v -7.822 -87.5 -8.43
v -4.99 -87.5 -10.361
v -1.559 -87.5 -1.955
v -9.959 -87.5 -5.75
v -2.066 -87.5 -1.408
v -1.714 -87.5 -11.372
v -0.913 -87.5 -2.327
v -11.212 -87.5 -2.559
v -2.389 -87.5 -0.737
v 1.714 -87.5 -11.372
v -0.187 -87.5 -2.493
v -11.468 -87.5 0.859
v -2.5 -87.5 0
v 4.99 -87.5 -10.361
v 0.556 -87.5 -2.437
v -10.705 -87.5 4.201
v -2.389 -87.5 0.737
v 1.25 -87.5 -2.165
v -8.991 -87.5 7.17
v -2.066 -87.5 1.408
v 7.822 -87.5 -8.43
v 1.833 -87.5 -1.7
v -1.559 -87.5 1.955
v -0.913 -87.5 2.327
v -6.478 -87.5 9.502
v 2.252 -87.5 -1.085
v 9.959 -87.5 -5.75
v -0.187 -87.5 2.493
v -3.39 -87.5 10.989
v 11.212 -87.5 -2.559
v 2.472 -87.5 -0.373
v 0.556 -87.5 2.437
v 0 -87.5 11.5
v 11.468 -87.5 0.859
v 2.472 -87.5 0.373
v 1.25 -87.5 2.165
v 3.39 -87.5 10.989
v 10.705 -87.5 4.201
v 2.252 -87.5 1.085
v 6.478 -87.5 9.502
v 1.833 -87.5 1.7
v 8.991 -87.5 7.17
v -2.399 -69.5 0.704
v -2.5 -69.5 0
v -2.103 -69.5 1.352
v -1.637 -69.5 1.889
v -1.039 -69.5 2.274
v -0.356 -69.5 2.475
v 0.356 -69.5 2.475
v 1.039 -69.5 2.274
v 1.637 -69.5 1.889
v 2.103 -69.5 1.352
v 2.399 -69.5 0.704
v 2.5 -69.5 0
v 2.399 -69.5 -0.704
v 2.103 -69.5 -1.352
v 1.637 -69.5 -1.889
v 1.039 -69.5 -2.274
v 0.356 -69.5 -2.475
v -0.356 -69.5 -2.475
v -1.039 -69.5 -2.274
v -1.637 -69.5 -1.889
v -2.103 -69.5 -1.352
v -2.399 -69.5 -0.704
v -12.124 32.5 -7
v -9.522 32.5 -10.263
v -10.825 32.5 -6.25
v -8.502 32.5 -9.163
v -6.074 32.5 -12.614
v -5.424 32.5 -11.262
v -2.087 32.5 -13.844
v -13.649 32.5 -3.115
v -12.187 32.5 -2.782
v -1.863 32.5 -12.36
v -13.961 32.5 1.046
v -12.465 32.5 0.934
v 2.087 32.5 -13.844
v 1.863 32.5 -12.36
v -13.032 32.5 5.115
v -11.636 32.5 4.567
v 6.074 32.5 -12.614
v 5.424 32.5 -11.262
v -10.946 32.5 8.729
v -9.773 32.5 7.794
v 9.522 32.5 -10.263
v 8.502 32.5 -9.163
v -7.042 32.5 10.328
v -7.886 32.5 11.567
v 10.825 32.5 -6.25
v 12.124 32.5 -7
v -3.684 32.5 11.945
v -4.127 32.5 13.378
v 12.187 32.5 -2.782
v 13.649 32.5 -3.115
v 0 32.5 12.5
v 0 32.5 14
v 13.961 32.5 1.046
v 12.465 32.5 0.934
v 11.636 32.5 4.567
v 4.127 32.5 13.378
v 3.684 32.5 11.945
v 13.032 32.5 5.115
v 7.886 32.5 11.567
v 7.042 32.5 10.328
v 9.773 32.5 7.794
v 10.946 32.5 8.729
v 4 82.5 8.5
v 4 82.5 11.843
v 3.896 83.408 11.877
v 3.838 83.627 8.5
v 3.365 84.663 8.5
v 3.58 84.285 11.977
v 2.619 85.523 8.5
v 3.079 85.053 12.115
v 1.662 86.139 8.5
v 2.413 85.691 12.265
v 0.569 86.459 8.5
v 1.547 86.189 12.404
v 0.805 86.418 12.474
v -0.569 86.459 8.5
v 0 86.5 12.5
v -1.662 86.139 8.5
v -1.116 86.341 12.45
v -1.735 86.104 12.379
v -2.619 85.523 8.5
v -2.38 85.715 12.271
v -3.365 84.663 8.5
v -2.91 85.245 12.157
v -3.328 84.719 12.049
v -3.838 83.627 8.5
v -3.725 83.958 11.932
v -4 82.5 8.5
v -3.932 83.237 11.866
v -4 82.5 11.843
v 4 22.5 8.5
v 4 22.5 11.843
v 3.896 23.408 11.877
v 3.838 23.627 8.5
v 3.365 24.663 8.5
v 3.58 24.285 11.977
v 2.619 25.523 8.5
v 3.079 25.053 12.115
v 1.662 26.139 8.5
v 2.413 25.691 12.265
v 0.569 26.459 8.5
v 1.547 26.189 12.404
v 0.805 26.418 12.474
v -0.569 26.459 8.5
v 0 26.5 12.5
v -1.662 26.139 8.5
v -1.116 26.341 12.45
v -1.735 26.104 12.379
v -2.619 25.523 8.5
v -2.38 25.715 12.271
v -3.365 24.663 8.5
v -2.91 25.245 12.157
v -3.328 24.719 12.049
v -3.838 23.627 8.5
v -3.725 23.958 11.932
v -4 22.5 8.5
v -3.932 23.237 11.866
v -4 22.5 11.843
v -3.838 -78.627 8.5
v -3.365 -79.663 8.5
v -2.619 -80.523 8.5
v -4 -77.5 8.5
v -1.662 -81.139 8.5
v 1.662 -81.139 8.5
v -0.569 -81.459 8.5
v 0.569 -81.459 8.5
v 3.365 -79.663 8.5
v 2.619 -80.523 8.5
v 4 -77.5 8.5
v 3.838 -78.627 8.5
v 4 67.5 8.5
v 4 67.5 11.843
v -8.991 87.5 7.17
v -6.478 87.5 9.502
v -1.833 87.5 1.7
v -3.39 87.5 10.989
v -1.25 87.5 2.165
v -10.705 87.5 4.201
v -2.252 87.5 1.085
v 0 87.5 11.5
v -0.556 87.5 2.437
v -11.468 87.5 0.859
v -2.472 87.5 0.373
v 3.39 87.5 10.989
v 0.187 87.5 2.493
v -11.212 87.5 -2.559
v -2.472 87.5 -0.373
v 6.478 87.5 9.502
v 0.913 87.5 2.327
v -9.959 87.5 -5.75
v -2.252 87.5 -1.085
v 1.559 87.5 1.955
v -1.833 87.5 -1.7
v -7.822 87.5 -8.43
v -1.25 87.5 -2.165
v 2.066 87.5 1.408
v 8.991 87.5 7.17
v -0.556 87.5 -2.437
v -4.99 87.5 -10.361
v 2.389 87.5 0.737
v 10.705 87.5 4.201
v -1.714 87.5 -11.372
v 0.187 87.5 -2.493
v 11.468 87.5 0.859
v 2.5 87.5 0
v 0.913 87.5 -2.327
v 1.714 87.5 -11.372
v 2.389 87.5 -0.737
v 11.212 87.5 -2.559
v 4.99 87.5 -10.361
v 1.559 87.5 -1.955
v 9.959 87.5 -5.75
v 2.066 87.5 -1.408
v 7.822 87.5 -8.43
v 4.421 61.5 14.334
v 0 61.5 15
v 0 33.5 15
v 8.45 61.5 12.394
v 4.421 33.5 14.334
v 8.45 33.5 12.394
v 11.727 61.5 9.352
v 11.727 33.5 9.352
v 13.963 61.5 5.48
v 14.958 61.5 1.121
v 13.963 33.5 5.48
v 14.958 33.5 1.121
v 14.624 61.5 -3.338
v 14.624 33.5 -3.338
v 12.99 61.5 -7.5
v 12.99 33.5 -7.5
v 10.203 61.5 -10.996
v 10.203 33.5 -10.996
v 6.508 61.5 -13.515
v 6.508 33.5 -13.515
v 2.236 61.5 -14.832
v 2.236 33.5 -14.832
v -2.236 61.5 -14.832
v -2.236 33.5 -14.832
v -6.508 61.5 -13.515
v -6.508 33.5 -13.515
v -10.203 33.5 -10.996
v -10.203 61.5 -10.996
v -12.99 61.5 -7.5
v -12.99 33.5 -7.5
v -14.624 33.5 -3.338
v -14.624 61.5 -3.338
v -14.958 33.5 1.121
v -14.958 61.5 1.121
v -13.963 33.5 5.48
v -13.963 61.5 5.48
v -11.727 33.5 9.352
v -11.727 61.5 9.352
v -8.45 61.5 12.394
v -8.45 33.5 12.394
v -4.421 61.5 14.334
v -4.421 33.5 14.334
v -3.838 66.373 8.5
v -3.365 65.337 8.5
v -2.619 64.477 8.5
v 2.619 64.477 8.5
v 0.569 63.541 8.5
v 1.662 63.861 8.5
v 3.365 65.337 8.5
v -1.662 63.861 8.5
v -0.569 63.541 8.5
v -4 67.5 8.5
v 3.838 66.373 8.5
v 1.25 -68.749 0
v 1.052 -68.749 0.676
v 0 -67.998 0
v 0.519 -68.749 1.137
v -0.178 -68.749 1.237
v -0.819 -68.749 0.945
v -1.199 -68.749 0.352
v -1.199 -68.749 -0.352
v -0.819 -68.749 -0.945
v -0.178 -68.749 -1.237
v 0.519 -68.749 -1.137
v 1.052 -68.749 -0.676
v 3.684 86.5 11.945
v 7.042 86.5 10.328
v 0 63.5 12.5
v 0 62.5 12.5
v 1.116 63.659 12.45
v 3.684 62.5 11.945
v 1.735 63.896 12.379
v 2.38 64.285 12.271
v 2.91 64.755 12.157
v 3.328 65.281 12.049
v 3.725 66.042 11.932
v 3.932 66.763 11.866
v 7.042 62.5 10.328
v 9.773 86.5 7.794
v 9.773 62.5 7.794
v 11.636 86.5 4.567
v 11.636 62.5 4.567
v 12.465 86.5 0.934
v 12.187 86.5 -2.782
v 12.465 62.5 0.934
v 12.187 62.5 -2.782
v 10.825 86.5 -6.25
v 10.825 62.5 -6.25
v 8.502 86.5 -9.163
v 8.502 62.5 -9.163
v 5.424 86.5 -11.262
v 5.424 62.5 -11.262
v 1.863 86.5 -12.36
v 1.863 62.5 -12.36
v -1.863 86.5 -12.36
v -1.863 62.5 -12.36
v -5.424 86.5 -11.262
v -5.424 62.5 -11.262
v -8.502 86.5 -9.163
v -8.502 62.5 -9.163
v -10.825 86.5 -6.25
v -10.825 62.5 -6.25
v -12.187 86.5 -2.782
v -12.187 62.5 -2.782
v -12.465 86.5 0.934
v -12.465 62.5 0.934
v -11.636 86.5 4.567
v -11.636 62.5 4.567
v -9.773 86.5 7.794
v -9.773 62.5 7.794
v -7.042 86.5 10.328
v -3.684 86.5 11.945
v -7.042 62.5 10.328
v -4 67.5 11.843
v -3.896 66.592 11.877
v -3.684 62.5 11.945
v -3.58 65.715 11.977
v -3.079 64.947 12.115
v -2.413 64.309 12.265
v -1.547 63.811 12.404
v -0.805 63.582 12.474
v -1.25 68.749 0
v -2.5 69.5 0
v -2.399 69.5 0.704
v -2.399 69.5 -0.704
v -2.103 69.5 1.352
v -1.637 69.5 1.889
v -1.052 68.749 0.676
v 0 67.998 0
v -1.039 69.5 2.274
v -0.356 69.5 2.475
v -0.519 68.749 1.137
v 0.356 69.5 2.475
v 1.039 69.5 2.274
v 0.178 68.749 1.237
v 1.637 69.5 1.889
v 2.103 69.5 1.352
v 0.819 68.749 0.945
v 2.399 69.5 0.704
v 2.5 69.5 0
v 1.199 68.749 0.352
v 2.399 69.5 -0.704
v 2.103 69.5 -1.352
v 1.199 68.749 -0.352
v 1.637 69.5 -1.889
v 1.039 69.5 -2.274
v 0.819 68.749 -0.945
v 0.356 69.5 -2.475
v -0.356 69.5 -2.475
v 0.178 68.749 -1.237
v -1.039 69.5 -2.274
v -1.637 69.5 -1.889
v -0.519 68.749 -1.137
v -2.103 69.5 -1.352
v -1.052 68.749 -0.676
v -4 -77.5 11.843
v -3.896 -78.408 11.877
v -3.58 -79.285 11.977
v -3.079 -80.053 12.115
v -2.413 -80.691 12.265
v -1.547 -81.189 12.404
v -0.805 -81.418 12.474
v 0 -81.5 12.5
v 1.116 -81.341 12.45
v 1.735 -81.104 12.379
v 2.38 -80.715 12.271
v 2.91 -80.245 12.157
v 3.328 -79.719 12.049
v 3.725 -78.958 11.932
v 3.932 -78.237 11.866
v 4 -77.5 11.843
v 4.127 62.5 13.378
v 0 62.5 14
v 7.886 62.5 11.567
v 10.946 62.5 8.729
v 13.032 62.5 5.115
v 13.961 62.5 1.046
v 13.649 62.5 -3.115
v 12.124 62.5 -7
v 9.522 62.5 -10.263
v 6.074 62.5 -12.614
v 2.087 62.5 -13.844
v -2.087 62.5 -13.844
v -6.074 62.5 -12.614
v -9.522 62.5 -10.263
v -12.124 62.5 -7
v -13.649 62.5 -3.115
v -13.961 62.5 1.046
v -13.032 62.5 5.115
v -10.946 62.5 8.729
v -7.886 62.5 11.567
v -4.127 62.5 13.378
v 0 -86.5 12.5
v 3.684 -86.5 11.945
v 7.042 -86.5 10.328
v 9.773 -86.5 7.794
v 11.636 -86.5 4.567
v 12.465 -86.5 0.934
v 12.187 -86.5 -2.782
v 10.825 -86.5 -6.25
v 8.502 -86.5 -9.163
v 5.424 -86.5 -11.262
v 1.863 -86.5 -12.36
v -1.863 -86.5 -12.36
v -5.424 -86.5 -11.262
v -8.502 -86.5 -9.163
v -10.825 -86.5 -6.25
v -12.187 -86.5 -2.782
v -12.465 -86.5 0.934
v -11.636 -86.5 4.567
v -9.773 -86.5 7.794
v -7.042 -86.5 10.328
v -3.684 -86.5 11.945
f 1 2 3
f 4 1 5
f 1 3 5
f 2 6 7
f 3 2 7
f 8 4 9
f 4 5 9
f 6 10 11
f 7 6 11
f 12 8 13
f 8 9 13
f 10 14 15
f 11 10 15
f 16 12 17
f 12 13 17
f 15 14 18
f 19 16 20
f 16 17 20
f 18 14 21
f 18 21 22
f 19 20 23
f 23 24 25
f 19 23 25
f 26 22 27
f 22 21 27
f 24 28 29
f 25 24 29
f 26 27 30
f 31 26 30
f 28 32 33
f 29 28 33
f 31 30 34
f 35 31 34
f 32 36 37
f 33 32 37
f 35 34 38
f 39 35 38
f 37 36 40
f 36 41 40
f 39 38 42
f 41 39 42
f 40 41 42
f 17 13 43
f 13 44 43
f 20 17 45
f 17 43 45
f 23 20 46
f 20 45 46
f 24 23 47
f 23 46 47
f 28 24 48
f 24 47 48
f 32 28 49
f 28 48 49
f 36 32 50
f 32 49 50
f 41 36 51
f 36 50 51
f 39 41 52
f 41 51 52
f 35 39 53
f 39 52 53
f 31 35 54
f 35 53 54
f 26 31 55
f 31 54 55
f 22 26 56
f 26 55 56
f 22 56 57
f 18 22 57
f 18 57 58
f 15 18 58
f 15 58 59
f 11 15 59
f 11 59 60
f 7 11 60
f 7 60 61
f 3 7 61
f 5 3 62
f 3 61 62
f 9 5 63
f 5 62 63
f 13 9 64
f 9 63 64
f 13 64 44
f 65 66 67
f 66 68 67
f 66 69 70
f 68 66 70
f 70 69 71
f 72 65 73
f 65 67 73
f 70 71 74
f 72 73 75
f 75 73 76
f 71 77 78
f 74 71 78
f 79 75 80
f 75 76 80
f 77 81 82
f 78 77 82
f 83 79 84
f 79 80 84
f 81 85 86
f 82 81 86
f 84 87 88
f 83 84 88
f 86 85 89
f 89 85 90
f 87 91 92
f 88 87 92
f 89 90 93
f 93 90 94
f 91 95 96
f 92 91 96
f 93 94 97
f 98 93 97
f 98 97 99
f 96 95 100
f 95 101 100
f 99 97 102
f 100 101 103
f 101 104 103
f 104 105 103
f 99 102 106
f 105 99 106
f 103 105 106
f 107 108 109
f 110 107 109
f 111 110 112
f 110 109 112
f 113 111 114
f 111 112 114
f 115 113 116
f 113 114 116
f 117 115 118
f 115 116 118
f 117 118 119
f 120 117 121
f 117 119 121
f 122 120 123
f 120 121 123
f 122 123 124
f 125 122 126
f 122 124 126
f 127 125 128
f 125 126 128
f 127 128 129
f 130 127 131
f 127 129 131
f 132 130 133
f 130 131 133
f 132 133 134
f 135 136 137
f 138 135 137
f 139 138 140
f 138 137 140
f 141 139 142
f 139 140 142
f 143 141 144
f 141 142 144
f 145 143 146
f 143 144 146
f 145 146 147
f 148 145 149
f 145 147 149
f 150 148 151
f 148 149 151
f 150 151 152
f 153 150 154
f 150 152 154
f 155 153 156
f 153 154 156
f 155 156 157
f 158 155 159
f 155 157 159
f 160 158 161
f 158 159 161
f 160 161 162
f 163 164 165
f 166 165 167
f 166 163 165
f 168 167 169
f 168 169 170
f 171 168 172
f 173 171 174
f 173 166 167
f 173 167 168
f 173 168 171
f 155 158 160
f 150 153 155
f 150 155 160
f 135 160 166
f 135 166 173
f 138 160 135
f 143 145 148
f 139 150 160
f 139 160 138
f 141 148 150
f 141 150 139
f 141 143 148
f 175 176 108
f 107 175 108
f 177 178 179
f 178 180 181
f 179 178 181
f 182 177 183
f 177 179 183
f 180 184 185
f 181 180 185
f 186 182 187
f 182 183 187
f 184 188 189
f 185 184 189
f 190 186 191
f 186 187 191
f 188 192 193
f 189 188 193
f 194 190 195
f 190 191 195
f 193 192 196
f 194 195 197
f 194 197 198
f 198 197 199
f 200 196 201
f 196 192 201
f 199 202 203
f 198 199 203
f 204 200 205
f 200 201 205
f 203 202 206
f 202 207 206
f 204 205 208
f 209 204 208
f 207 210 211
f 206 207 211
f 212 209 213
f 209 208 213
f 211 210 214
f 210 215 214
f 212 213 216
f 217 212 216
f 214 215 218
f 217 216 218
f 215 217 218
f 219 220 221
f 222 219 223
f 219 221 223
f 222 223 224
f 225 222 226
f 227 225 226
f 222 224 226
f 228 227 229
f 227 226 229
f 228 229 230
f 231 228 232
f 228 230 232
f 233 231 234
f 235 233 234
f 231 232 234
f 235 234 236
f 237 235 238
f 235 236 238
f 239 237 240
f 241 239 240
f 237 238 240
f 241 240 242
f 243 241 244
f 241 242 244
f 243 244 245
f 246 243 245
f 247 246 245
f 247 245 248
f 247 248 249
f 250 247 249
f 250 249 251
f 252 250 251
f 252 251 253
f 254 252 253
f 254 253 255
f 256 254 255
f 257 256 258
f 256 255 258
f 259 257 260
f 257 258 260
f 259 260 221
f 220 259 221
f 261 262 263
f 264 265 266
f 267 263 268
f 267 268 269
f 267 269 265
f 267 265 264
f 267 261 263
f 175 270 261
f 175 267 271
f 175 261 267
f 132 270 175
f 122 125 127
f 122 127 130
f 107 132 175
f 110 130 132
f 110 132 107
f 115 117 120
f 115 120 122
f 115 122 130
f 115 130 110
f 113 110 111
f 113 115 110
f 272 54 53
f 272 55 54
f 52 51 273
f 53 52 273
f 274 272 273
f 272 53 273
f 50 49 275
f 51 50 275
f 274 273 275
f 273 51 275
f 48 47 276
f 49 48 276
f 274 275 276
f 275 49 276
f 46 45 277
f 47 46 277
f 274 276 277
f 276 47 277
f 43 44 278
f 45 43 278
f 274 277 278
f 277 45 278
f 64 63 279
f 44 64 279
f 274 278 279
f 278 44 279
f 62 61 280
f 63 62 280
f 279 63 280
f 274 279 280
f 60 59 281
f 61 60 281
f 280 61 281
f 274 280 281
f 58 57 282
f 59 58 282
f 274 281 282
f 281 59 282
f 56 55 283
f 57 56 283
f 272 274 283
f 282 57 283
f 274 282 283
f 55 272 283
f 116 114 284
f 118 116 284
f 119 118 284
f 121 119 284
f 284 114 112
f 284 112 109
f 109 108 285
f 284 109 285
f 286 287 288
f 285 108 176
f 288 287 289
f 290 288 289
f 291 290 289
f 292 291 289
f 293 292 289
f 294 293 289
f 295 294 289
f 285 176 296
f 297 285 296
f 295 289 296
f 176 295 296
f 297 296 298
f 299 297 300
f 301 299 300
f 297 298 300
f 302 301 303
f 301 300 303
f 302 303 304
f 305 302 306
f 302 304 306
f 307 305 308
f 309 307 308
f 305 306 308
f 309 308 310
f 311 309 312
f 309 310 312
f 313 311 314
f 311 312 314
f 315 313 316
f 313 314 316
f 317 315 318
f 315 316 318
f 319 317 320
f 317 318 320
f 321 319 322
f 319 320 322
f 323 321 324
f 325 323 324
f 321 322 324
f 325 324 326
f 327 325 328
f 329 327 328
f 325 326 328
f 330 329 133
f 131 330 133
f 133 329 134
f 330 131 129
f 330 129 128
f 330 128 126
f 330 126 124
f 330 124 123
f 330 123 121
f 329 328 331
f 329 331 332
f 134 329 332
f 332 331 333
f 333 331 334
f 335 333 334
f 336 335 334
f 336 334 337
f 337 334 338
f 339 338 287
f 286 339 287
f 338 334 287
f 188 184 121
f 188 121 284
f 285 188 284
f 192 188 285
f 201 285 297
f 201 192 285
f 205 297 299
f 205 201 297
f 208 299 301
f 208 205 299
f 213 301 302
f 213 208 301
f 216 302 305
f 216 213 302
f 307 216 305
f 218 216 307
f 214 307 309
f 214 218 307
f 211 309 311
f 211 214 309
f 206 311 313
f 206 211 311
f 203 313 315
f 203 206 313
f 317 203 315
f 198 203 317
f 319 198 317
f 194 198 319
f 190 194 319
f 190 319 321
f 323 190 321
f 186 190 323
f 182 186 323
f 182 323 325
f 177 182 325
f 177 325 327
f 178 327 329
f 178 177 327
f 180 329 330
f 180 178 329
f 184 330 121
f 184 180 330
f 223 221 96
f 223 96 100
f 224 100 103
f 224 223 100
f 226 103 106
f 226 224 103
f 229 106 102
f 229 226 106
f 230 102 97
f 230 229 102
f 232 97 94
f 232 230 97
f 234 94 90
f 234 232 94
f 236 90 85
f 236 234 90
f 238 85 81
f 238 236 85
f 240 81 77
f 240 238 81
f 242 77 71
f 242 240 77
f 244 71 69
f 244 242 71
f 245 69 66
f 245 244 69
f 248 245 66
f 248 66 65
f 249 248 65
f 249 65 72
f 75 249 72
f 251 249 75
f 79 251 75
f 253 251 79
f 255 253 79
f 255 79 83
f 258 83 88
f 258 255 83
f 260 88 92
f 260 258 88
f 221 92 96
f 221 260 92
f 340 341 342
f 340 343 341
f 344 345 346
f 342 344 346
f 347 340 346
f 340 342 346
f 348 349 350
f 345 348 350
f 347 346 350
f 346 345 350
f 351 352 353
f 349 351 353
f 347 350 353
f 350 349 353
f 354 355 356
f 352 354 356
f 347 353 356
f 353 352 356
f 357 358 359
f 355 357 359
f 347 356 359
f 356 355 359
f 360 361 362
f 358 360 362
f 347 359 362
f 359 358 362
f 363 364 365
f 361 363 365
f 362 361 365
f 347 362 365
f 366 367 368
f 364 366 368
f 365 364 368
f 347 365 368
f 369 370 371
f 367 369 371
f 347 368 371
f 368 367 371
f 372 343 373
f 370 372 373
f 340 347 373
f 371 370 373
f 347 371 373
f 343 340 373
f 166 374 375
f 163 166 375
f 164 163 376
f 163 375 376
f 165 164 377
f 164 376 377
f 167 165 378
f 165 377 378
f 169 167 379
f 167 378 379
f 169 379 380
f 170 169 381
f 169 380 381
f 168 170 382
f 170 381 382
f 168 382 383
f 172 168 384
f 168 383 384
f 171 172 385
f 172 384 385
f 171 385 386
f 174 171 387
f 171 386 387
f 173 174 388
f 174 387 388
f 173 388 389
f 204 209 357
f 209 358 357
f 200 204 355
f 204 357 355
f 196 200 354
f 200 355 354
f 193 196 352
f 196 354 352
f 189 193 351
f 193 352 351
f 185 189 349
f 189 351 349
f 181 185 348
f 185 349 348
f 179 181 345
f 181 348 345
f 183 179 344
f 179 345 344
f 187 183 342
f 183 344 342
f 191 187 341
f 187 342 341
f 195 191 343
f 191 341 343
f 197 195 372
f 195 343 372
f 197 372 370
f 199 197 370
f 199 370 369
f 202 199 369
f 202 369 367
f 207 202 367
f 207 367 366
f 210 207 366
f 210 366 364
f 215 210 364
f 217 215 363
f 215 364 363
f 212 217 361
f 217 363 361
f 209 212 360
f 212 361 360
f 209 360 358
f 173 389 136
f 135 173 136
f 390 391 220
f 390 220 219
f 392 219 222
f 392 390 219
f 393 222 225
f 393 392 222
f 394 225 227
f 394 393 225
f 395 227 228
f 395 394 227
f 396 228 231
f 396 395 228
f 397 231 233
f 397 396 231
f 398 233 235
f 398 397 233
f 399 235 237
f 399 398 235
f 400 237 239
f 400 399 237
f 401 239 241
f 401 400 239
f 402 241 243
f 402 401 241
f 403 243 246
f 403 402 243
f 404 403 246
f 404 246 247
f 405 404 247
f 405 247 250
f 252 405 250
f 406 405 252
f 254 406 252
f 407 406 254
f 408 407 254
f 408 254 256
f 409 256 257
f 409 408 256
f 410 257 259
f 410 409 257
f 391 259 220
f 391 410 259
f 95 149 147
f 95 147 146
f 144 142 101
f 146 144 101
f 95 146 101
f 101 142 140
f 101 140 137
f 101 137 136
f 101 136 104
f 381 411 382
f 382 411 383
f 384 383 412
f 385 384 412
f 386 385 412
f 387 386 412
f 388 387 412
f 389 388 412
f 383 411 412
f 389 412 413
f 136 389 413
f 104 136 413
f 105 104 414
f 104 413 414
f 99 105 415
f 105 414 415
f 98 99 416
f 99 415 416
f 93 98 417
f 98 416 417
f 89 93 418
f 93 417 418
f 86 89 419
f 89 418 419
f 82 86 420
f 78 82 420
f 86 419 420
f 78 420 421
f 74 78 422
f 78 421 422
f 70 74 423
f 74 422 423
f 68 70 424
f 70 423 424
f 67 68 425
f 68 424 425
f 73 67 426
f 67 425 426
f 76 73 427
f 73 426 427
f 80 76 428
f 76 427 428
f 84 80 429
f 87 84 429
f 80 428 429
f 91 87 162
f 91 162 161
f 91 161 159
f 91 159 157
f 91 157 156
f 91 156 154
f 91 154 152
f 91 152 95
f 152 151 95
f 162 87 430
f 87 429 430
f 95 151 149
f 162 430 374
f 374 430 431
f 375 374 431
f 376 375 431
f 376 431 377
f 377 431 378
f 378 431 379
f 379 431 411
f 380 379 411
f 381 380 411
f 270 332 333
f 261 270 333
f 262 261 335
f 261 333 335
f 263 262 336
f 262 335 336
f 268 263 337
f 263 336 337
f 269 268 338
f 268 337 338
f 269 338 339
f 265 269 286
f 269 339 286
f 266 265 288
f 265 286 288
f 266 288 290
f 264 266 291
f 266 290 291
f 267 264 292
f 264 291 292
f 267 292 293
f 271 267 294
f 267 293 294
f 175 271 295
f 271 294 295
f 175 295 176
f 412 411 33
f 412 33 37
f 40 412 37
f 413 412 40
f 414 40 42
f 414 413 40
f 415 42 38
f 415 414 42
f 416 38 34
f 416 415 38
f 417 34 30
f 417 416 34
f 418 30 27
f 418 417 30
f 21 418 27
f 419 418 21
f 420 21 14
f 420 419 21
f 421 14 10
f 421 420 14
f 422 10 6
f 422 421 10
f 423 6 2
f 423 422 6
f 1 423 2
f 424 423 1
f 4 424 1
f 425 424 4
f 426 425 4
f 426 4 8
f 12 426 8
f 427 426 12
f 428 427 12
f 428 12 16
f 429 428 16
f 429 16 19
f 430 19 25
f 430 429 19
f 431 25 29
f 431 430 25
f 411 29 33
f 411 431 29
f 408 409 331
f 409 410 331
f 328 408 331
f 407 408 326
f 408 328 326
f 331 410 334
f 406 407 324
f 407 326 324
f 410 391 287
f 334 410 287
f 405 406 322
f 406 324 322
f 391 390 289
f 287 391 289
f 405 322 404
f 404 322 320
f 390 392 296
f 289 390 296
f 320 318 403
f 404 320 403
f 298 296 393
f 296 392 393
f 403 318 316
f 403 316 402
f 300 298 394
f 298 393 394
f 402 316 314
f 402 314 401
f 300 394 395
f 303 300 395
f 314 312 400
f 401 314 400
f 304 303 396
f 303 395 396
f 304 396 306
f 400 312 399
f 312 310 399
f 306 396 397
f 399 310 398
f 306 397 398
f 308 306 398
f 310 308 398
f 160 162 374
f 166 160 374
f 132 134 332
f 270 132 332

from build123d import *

# Parameters (mm, degrees)
F4_D           = 5
F4_DEPTH       = 18
F4_TIP         = 1.5021515476
F4_ON_F3_D     = 5
F4_ON_F3_DEPTH = 18
F4_ON_F3_TIP   = 1.5021515476
F5_SIZE        = 1
F8_DEPTH       = 4


with BuildPart() as f1:
    # F0 (on Right) → F1 (revolve)
    with BuildSketch(Plane.YZ):
        Polygon((-87.5, 12.5), (-87.5, 0), (87.5, 0), (87.5, 12.5), (62.5, 12.5), (62.5, 15), (32.5, 15), (32.5, 12.5), align=None)
    revolve(axis=Axis((0, 0, 0), (0, 1, 0)))

    # F4
    with Locations(Plane.XZ.offset(87.5)):
        with Locations((0, 0)):
            Hole(F4_D / 2, depth=F4_DEPTH)
            with Locations((0, 0, -(F4_DEPTH + F4_TIP / 2))):  # 118° drill point
                Cone(0, F4_D / 2, F4_TIP, mode=Mode.SUBTRACT)

    # F4 on F3
    with Locations(Plane(origin=(0, 87.5, 0), x_dir=(-1, 0, 0), z_dir=(0, 1, 0))):
        with Locations((0, 0)):
            Hole(F4_ON_F3_D / 2, depth=F4_ON_F3_DEPTH)
            with Locations((0, 0, -(F4_ON_F3_DEPTH + F4_ON_F3_TIP / 2))):  # 118° drill point
                Cone(0, F4_ON_F3_D / 2, F4_ON_F3_TIP, mode=Mode.SUBTRACT)

    # F5
    f5_edges = [f1.edges().sort_by_distance(p)[0] for p in [
        (0, -87.5, -12.5),
        (0, 87.5, -12.5),
        (0, 32.5, -15),
        (0, 62.5, -15),
    ]]
    chamfer(f5_edges, length=F5_SIZE)

    # F7 (on offset) → F8 (cut)
    with BuildSketch(Plane.XY.offset(12.5)):
        with BuildLine():
            ThreePointArc((-4, -77.5), (0, -81.5), (4, -77.5))
            Line((4, -77.5), (4, 22.5))
            ThreePointArc((4, 22.5), (0, 26.5), (-4, 22.5))
            Line((-4, 22.5), (-4, -77.5))
        make_face()
        with BuildLine():
            ThreePointArc((-4, 67.5), (0, 63.5), (4, 67.5))
            Line((4, 67.5), (4, 82.5))
            ThreePointArc((4, 82.5), (0, 86.5), (-4, 82.5))
            Line((-4, 82.5), (-4, 67.5))
        make_face()
    extrude(amount=-F8_DEPTH, mode=Mode.SUBTRACT)


solid = f1.part
